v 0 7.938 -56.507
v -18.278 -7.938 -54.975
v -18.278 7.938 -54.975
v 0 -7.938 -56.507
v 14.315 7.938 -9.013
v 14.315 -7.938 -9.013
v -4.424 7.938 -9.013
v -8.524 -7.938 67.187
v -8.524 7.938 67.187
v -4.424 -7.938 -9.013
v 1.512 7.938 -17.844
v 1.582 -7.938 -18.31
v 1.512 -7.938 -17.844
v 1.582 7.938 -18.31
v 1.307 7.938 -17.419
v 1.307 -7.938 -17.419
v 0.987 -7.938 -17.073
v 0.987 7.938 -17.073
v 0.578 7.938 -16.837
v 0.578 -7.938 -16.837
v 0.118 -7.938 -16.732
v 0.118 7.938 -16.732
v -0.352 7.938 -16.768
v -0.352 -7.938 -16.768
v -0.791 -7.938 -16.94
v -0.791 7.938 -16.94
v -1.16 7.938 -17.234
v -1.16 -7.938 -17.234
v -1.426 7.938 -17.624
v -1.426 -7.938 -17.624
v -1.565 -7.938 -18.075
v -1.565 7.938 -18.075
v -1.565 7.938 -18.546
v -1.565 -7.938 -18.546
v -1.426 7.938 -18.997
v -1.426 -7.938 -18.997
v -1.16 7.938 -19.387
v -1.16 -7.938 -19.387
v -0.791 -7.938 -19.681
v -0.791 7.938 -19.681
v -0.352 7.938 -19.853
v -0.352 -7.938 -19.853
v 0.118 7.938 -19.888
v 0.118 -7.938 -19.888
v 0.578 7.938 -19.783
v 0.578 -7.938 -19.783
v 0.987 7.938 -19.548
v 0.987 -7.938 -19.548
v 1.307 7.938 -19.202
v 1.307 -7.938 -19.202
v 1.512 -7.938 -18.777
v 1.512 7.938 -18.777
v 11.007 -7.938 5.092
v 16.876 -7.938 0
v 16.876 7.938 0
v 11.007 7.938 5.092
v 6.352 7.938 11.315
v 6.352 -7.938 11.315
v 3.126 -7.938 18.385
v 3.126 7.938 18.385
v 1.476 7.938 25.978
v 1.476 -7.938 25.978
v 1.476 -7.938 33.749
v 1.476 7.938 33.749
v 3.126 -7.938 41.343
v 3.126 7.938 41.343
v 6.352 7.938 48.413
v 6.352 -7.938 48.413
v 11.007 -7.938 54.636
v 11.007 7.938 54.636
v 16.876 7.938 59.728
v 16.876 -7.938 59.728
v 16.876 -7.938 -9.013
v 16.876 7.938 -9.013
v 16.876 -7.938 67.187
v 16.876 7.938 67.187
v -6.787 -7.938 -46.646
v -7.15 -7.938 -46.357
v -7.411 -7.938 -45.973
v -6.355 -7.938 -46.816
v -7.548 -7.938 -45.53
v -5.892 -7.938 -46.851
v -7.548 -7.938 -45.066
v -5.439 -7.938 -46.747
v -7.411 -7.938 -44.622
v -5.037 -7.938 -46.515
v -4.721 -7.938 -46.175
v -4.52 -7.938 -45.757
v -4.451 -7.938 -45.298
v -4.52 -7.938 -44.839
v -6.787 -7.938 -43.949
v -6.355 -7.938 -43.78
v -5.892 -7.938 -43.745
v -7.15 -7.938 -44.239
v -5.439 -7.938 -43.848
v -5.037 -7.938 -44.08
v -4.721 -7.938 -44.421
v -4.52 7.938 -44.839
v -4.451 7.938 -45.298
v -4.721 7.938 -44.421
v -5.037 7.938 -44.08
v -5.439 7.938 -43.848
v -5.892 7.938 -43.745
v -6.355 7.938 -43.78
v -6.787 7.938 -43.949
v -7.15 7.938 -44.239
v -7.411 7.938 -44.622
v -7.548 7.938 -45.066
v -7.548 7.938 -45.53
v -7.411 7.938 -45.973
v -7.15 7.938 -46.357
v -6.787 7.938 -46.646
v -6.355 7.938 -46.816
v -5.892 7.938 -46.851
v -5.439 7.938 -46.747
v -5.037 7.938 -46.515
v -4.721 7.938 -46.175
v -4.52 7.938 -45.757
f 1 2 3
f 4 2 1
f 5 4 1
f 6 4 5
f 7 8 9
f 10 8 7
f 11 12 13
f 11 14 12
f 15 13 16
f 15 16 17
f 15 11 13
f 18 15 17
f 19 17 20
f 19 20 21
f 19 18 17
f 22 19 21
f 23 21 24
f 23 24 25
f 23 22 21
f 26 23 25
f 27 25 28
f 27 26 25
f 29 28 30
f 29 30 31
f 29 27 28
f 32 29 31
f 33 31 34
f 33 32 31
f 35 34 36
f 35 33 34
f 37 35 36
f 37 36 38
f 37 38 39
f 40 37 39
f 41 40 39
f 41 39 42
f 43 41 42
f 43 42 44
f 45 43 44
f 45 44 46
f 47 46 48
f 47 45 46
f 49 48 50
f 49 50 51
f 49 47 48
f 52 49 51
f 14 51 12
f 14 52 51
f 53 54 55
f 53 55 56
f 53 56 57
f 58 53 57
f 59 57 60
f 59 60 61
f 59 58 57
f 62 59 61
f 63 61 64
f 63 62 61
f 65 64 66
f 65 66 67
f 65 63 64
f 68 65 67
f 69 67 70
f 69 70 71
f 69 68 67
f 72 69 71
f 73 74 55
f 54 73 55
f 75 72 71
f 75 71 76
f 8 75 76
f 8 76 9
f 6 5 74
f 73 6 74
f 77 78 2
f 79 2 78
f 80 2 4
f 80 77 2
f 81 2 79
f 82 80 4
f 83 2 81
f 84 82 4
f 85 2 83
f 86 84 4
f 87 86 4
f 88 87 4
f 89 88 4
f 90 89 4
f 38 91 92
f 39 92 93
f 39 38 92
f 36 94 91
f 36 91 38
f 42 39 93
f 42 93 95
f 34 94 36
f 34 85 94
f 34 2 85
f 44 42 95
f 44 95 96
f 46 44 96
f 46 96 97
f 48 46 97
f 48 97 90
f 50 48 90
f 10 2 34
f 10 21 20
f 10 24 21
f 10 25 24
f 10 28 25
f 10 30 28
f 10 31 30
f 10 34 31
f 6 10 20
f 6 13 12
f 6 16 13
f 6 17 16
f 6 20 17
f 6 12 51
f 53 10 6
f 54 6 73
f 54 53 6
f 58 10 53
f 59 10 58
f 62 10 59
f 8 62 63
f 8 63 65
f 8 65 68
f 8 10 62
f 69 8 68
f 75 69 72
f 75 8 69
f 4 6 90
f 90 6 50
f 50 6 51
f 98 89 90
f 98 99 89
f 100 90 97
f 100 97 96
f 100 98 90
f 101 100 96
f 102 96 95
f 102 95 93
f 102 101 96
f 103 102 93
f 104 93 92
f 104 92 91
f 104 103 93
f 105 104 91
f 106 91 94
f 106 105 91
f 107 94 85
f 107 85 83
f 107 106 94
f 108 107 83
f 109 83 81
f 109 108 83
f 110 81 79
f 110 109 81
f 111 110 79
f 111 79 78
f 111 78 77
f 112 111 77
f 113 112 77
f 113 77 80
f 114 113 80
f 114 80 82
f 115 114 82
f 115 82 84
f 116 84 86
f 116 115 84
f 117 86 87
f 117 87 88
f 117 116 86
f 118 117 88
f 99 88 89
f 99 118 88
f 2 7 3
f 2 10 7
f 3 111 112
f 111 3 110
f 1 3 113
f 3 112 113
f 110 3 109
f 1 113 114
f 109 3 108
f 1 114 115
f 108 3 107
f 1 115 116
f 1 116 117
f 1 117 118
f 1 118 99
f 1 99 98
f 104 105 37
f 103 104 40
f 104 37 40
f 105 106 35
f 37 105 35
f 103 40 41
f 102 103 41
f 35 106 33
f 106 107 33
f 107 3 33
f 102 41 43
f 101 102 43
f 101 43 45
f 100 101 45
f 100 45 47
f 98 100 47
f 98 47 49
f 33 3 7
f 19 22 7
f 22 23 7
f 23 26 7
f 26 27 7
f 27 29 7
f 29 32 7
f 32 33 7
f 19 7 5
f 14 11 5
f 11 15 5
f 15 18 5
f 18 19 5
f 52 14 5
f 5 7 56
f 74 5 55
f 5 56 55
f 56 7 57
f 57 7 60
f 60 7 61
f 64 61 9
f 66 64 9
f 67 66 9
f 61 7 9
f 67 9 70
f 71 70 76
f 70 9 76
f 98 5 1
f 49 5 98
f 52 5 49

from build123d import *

# Parameters (mm, degrees)
F0_R     = 1.5571839485
F0_R_2   = 1.582453361
F1_DEPTH = 7.9375


# Not quite as in the source:
# - a feature names something its author has since deleted; it is built from what else it names


with BuildPart() as f1:
    # F0 (on Front) → F1 (new body, symmetric)
    with BuildSketch(Plane.XZ):
        with BuildLine():
            Line((-4.4244504534, -9.0134367347), (14.3148868547, -9.0134367347))
            Line((14.3148868547, -9.0134367347), (16.876486437, -9.0134367347))
            Line((16.876486437, -9.0134367347), (16.876486437, 0))
            ThreePointArc((16.876486437, 0), (1.2674691421, 29.8639013079), (16.876486437, 59.7278026158))
            Line((16.876486437, 59.7278026158), (16.876486437, 67.1865632653))
            Line((16.876486437, 67.1865632653), (-8.523513563, 67.1865632653))
            Line((-8.523513563, 67.1865632653), (-4.4244504534, -9.0134367347))
        make_face()
        Polygon((0, -56.506741792), (14.3148868547, -9.0134367347), (-4.4244504534, -9.0134367347), (-18.2776516019, -54.9749811636), align=None)
        with Locations((-6.0080750845, -45.2978610992)):
            Circle(F0_R, mode=Mode.SUBTRACT)
        with Locations((0, -18.3103610992)):
            Circle(F0_R_2, mode=Mode.SUBTRACT)
    extrude(amount=F1_DEPTH, both=True)


solid = f1.part
